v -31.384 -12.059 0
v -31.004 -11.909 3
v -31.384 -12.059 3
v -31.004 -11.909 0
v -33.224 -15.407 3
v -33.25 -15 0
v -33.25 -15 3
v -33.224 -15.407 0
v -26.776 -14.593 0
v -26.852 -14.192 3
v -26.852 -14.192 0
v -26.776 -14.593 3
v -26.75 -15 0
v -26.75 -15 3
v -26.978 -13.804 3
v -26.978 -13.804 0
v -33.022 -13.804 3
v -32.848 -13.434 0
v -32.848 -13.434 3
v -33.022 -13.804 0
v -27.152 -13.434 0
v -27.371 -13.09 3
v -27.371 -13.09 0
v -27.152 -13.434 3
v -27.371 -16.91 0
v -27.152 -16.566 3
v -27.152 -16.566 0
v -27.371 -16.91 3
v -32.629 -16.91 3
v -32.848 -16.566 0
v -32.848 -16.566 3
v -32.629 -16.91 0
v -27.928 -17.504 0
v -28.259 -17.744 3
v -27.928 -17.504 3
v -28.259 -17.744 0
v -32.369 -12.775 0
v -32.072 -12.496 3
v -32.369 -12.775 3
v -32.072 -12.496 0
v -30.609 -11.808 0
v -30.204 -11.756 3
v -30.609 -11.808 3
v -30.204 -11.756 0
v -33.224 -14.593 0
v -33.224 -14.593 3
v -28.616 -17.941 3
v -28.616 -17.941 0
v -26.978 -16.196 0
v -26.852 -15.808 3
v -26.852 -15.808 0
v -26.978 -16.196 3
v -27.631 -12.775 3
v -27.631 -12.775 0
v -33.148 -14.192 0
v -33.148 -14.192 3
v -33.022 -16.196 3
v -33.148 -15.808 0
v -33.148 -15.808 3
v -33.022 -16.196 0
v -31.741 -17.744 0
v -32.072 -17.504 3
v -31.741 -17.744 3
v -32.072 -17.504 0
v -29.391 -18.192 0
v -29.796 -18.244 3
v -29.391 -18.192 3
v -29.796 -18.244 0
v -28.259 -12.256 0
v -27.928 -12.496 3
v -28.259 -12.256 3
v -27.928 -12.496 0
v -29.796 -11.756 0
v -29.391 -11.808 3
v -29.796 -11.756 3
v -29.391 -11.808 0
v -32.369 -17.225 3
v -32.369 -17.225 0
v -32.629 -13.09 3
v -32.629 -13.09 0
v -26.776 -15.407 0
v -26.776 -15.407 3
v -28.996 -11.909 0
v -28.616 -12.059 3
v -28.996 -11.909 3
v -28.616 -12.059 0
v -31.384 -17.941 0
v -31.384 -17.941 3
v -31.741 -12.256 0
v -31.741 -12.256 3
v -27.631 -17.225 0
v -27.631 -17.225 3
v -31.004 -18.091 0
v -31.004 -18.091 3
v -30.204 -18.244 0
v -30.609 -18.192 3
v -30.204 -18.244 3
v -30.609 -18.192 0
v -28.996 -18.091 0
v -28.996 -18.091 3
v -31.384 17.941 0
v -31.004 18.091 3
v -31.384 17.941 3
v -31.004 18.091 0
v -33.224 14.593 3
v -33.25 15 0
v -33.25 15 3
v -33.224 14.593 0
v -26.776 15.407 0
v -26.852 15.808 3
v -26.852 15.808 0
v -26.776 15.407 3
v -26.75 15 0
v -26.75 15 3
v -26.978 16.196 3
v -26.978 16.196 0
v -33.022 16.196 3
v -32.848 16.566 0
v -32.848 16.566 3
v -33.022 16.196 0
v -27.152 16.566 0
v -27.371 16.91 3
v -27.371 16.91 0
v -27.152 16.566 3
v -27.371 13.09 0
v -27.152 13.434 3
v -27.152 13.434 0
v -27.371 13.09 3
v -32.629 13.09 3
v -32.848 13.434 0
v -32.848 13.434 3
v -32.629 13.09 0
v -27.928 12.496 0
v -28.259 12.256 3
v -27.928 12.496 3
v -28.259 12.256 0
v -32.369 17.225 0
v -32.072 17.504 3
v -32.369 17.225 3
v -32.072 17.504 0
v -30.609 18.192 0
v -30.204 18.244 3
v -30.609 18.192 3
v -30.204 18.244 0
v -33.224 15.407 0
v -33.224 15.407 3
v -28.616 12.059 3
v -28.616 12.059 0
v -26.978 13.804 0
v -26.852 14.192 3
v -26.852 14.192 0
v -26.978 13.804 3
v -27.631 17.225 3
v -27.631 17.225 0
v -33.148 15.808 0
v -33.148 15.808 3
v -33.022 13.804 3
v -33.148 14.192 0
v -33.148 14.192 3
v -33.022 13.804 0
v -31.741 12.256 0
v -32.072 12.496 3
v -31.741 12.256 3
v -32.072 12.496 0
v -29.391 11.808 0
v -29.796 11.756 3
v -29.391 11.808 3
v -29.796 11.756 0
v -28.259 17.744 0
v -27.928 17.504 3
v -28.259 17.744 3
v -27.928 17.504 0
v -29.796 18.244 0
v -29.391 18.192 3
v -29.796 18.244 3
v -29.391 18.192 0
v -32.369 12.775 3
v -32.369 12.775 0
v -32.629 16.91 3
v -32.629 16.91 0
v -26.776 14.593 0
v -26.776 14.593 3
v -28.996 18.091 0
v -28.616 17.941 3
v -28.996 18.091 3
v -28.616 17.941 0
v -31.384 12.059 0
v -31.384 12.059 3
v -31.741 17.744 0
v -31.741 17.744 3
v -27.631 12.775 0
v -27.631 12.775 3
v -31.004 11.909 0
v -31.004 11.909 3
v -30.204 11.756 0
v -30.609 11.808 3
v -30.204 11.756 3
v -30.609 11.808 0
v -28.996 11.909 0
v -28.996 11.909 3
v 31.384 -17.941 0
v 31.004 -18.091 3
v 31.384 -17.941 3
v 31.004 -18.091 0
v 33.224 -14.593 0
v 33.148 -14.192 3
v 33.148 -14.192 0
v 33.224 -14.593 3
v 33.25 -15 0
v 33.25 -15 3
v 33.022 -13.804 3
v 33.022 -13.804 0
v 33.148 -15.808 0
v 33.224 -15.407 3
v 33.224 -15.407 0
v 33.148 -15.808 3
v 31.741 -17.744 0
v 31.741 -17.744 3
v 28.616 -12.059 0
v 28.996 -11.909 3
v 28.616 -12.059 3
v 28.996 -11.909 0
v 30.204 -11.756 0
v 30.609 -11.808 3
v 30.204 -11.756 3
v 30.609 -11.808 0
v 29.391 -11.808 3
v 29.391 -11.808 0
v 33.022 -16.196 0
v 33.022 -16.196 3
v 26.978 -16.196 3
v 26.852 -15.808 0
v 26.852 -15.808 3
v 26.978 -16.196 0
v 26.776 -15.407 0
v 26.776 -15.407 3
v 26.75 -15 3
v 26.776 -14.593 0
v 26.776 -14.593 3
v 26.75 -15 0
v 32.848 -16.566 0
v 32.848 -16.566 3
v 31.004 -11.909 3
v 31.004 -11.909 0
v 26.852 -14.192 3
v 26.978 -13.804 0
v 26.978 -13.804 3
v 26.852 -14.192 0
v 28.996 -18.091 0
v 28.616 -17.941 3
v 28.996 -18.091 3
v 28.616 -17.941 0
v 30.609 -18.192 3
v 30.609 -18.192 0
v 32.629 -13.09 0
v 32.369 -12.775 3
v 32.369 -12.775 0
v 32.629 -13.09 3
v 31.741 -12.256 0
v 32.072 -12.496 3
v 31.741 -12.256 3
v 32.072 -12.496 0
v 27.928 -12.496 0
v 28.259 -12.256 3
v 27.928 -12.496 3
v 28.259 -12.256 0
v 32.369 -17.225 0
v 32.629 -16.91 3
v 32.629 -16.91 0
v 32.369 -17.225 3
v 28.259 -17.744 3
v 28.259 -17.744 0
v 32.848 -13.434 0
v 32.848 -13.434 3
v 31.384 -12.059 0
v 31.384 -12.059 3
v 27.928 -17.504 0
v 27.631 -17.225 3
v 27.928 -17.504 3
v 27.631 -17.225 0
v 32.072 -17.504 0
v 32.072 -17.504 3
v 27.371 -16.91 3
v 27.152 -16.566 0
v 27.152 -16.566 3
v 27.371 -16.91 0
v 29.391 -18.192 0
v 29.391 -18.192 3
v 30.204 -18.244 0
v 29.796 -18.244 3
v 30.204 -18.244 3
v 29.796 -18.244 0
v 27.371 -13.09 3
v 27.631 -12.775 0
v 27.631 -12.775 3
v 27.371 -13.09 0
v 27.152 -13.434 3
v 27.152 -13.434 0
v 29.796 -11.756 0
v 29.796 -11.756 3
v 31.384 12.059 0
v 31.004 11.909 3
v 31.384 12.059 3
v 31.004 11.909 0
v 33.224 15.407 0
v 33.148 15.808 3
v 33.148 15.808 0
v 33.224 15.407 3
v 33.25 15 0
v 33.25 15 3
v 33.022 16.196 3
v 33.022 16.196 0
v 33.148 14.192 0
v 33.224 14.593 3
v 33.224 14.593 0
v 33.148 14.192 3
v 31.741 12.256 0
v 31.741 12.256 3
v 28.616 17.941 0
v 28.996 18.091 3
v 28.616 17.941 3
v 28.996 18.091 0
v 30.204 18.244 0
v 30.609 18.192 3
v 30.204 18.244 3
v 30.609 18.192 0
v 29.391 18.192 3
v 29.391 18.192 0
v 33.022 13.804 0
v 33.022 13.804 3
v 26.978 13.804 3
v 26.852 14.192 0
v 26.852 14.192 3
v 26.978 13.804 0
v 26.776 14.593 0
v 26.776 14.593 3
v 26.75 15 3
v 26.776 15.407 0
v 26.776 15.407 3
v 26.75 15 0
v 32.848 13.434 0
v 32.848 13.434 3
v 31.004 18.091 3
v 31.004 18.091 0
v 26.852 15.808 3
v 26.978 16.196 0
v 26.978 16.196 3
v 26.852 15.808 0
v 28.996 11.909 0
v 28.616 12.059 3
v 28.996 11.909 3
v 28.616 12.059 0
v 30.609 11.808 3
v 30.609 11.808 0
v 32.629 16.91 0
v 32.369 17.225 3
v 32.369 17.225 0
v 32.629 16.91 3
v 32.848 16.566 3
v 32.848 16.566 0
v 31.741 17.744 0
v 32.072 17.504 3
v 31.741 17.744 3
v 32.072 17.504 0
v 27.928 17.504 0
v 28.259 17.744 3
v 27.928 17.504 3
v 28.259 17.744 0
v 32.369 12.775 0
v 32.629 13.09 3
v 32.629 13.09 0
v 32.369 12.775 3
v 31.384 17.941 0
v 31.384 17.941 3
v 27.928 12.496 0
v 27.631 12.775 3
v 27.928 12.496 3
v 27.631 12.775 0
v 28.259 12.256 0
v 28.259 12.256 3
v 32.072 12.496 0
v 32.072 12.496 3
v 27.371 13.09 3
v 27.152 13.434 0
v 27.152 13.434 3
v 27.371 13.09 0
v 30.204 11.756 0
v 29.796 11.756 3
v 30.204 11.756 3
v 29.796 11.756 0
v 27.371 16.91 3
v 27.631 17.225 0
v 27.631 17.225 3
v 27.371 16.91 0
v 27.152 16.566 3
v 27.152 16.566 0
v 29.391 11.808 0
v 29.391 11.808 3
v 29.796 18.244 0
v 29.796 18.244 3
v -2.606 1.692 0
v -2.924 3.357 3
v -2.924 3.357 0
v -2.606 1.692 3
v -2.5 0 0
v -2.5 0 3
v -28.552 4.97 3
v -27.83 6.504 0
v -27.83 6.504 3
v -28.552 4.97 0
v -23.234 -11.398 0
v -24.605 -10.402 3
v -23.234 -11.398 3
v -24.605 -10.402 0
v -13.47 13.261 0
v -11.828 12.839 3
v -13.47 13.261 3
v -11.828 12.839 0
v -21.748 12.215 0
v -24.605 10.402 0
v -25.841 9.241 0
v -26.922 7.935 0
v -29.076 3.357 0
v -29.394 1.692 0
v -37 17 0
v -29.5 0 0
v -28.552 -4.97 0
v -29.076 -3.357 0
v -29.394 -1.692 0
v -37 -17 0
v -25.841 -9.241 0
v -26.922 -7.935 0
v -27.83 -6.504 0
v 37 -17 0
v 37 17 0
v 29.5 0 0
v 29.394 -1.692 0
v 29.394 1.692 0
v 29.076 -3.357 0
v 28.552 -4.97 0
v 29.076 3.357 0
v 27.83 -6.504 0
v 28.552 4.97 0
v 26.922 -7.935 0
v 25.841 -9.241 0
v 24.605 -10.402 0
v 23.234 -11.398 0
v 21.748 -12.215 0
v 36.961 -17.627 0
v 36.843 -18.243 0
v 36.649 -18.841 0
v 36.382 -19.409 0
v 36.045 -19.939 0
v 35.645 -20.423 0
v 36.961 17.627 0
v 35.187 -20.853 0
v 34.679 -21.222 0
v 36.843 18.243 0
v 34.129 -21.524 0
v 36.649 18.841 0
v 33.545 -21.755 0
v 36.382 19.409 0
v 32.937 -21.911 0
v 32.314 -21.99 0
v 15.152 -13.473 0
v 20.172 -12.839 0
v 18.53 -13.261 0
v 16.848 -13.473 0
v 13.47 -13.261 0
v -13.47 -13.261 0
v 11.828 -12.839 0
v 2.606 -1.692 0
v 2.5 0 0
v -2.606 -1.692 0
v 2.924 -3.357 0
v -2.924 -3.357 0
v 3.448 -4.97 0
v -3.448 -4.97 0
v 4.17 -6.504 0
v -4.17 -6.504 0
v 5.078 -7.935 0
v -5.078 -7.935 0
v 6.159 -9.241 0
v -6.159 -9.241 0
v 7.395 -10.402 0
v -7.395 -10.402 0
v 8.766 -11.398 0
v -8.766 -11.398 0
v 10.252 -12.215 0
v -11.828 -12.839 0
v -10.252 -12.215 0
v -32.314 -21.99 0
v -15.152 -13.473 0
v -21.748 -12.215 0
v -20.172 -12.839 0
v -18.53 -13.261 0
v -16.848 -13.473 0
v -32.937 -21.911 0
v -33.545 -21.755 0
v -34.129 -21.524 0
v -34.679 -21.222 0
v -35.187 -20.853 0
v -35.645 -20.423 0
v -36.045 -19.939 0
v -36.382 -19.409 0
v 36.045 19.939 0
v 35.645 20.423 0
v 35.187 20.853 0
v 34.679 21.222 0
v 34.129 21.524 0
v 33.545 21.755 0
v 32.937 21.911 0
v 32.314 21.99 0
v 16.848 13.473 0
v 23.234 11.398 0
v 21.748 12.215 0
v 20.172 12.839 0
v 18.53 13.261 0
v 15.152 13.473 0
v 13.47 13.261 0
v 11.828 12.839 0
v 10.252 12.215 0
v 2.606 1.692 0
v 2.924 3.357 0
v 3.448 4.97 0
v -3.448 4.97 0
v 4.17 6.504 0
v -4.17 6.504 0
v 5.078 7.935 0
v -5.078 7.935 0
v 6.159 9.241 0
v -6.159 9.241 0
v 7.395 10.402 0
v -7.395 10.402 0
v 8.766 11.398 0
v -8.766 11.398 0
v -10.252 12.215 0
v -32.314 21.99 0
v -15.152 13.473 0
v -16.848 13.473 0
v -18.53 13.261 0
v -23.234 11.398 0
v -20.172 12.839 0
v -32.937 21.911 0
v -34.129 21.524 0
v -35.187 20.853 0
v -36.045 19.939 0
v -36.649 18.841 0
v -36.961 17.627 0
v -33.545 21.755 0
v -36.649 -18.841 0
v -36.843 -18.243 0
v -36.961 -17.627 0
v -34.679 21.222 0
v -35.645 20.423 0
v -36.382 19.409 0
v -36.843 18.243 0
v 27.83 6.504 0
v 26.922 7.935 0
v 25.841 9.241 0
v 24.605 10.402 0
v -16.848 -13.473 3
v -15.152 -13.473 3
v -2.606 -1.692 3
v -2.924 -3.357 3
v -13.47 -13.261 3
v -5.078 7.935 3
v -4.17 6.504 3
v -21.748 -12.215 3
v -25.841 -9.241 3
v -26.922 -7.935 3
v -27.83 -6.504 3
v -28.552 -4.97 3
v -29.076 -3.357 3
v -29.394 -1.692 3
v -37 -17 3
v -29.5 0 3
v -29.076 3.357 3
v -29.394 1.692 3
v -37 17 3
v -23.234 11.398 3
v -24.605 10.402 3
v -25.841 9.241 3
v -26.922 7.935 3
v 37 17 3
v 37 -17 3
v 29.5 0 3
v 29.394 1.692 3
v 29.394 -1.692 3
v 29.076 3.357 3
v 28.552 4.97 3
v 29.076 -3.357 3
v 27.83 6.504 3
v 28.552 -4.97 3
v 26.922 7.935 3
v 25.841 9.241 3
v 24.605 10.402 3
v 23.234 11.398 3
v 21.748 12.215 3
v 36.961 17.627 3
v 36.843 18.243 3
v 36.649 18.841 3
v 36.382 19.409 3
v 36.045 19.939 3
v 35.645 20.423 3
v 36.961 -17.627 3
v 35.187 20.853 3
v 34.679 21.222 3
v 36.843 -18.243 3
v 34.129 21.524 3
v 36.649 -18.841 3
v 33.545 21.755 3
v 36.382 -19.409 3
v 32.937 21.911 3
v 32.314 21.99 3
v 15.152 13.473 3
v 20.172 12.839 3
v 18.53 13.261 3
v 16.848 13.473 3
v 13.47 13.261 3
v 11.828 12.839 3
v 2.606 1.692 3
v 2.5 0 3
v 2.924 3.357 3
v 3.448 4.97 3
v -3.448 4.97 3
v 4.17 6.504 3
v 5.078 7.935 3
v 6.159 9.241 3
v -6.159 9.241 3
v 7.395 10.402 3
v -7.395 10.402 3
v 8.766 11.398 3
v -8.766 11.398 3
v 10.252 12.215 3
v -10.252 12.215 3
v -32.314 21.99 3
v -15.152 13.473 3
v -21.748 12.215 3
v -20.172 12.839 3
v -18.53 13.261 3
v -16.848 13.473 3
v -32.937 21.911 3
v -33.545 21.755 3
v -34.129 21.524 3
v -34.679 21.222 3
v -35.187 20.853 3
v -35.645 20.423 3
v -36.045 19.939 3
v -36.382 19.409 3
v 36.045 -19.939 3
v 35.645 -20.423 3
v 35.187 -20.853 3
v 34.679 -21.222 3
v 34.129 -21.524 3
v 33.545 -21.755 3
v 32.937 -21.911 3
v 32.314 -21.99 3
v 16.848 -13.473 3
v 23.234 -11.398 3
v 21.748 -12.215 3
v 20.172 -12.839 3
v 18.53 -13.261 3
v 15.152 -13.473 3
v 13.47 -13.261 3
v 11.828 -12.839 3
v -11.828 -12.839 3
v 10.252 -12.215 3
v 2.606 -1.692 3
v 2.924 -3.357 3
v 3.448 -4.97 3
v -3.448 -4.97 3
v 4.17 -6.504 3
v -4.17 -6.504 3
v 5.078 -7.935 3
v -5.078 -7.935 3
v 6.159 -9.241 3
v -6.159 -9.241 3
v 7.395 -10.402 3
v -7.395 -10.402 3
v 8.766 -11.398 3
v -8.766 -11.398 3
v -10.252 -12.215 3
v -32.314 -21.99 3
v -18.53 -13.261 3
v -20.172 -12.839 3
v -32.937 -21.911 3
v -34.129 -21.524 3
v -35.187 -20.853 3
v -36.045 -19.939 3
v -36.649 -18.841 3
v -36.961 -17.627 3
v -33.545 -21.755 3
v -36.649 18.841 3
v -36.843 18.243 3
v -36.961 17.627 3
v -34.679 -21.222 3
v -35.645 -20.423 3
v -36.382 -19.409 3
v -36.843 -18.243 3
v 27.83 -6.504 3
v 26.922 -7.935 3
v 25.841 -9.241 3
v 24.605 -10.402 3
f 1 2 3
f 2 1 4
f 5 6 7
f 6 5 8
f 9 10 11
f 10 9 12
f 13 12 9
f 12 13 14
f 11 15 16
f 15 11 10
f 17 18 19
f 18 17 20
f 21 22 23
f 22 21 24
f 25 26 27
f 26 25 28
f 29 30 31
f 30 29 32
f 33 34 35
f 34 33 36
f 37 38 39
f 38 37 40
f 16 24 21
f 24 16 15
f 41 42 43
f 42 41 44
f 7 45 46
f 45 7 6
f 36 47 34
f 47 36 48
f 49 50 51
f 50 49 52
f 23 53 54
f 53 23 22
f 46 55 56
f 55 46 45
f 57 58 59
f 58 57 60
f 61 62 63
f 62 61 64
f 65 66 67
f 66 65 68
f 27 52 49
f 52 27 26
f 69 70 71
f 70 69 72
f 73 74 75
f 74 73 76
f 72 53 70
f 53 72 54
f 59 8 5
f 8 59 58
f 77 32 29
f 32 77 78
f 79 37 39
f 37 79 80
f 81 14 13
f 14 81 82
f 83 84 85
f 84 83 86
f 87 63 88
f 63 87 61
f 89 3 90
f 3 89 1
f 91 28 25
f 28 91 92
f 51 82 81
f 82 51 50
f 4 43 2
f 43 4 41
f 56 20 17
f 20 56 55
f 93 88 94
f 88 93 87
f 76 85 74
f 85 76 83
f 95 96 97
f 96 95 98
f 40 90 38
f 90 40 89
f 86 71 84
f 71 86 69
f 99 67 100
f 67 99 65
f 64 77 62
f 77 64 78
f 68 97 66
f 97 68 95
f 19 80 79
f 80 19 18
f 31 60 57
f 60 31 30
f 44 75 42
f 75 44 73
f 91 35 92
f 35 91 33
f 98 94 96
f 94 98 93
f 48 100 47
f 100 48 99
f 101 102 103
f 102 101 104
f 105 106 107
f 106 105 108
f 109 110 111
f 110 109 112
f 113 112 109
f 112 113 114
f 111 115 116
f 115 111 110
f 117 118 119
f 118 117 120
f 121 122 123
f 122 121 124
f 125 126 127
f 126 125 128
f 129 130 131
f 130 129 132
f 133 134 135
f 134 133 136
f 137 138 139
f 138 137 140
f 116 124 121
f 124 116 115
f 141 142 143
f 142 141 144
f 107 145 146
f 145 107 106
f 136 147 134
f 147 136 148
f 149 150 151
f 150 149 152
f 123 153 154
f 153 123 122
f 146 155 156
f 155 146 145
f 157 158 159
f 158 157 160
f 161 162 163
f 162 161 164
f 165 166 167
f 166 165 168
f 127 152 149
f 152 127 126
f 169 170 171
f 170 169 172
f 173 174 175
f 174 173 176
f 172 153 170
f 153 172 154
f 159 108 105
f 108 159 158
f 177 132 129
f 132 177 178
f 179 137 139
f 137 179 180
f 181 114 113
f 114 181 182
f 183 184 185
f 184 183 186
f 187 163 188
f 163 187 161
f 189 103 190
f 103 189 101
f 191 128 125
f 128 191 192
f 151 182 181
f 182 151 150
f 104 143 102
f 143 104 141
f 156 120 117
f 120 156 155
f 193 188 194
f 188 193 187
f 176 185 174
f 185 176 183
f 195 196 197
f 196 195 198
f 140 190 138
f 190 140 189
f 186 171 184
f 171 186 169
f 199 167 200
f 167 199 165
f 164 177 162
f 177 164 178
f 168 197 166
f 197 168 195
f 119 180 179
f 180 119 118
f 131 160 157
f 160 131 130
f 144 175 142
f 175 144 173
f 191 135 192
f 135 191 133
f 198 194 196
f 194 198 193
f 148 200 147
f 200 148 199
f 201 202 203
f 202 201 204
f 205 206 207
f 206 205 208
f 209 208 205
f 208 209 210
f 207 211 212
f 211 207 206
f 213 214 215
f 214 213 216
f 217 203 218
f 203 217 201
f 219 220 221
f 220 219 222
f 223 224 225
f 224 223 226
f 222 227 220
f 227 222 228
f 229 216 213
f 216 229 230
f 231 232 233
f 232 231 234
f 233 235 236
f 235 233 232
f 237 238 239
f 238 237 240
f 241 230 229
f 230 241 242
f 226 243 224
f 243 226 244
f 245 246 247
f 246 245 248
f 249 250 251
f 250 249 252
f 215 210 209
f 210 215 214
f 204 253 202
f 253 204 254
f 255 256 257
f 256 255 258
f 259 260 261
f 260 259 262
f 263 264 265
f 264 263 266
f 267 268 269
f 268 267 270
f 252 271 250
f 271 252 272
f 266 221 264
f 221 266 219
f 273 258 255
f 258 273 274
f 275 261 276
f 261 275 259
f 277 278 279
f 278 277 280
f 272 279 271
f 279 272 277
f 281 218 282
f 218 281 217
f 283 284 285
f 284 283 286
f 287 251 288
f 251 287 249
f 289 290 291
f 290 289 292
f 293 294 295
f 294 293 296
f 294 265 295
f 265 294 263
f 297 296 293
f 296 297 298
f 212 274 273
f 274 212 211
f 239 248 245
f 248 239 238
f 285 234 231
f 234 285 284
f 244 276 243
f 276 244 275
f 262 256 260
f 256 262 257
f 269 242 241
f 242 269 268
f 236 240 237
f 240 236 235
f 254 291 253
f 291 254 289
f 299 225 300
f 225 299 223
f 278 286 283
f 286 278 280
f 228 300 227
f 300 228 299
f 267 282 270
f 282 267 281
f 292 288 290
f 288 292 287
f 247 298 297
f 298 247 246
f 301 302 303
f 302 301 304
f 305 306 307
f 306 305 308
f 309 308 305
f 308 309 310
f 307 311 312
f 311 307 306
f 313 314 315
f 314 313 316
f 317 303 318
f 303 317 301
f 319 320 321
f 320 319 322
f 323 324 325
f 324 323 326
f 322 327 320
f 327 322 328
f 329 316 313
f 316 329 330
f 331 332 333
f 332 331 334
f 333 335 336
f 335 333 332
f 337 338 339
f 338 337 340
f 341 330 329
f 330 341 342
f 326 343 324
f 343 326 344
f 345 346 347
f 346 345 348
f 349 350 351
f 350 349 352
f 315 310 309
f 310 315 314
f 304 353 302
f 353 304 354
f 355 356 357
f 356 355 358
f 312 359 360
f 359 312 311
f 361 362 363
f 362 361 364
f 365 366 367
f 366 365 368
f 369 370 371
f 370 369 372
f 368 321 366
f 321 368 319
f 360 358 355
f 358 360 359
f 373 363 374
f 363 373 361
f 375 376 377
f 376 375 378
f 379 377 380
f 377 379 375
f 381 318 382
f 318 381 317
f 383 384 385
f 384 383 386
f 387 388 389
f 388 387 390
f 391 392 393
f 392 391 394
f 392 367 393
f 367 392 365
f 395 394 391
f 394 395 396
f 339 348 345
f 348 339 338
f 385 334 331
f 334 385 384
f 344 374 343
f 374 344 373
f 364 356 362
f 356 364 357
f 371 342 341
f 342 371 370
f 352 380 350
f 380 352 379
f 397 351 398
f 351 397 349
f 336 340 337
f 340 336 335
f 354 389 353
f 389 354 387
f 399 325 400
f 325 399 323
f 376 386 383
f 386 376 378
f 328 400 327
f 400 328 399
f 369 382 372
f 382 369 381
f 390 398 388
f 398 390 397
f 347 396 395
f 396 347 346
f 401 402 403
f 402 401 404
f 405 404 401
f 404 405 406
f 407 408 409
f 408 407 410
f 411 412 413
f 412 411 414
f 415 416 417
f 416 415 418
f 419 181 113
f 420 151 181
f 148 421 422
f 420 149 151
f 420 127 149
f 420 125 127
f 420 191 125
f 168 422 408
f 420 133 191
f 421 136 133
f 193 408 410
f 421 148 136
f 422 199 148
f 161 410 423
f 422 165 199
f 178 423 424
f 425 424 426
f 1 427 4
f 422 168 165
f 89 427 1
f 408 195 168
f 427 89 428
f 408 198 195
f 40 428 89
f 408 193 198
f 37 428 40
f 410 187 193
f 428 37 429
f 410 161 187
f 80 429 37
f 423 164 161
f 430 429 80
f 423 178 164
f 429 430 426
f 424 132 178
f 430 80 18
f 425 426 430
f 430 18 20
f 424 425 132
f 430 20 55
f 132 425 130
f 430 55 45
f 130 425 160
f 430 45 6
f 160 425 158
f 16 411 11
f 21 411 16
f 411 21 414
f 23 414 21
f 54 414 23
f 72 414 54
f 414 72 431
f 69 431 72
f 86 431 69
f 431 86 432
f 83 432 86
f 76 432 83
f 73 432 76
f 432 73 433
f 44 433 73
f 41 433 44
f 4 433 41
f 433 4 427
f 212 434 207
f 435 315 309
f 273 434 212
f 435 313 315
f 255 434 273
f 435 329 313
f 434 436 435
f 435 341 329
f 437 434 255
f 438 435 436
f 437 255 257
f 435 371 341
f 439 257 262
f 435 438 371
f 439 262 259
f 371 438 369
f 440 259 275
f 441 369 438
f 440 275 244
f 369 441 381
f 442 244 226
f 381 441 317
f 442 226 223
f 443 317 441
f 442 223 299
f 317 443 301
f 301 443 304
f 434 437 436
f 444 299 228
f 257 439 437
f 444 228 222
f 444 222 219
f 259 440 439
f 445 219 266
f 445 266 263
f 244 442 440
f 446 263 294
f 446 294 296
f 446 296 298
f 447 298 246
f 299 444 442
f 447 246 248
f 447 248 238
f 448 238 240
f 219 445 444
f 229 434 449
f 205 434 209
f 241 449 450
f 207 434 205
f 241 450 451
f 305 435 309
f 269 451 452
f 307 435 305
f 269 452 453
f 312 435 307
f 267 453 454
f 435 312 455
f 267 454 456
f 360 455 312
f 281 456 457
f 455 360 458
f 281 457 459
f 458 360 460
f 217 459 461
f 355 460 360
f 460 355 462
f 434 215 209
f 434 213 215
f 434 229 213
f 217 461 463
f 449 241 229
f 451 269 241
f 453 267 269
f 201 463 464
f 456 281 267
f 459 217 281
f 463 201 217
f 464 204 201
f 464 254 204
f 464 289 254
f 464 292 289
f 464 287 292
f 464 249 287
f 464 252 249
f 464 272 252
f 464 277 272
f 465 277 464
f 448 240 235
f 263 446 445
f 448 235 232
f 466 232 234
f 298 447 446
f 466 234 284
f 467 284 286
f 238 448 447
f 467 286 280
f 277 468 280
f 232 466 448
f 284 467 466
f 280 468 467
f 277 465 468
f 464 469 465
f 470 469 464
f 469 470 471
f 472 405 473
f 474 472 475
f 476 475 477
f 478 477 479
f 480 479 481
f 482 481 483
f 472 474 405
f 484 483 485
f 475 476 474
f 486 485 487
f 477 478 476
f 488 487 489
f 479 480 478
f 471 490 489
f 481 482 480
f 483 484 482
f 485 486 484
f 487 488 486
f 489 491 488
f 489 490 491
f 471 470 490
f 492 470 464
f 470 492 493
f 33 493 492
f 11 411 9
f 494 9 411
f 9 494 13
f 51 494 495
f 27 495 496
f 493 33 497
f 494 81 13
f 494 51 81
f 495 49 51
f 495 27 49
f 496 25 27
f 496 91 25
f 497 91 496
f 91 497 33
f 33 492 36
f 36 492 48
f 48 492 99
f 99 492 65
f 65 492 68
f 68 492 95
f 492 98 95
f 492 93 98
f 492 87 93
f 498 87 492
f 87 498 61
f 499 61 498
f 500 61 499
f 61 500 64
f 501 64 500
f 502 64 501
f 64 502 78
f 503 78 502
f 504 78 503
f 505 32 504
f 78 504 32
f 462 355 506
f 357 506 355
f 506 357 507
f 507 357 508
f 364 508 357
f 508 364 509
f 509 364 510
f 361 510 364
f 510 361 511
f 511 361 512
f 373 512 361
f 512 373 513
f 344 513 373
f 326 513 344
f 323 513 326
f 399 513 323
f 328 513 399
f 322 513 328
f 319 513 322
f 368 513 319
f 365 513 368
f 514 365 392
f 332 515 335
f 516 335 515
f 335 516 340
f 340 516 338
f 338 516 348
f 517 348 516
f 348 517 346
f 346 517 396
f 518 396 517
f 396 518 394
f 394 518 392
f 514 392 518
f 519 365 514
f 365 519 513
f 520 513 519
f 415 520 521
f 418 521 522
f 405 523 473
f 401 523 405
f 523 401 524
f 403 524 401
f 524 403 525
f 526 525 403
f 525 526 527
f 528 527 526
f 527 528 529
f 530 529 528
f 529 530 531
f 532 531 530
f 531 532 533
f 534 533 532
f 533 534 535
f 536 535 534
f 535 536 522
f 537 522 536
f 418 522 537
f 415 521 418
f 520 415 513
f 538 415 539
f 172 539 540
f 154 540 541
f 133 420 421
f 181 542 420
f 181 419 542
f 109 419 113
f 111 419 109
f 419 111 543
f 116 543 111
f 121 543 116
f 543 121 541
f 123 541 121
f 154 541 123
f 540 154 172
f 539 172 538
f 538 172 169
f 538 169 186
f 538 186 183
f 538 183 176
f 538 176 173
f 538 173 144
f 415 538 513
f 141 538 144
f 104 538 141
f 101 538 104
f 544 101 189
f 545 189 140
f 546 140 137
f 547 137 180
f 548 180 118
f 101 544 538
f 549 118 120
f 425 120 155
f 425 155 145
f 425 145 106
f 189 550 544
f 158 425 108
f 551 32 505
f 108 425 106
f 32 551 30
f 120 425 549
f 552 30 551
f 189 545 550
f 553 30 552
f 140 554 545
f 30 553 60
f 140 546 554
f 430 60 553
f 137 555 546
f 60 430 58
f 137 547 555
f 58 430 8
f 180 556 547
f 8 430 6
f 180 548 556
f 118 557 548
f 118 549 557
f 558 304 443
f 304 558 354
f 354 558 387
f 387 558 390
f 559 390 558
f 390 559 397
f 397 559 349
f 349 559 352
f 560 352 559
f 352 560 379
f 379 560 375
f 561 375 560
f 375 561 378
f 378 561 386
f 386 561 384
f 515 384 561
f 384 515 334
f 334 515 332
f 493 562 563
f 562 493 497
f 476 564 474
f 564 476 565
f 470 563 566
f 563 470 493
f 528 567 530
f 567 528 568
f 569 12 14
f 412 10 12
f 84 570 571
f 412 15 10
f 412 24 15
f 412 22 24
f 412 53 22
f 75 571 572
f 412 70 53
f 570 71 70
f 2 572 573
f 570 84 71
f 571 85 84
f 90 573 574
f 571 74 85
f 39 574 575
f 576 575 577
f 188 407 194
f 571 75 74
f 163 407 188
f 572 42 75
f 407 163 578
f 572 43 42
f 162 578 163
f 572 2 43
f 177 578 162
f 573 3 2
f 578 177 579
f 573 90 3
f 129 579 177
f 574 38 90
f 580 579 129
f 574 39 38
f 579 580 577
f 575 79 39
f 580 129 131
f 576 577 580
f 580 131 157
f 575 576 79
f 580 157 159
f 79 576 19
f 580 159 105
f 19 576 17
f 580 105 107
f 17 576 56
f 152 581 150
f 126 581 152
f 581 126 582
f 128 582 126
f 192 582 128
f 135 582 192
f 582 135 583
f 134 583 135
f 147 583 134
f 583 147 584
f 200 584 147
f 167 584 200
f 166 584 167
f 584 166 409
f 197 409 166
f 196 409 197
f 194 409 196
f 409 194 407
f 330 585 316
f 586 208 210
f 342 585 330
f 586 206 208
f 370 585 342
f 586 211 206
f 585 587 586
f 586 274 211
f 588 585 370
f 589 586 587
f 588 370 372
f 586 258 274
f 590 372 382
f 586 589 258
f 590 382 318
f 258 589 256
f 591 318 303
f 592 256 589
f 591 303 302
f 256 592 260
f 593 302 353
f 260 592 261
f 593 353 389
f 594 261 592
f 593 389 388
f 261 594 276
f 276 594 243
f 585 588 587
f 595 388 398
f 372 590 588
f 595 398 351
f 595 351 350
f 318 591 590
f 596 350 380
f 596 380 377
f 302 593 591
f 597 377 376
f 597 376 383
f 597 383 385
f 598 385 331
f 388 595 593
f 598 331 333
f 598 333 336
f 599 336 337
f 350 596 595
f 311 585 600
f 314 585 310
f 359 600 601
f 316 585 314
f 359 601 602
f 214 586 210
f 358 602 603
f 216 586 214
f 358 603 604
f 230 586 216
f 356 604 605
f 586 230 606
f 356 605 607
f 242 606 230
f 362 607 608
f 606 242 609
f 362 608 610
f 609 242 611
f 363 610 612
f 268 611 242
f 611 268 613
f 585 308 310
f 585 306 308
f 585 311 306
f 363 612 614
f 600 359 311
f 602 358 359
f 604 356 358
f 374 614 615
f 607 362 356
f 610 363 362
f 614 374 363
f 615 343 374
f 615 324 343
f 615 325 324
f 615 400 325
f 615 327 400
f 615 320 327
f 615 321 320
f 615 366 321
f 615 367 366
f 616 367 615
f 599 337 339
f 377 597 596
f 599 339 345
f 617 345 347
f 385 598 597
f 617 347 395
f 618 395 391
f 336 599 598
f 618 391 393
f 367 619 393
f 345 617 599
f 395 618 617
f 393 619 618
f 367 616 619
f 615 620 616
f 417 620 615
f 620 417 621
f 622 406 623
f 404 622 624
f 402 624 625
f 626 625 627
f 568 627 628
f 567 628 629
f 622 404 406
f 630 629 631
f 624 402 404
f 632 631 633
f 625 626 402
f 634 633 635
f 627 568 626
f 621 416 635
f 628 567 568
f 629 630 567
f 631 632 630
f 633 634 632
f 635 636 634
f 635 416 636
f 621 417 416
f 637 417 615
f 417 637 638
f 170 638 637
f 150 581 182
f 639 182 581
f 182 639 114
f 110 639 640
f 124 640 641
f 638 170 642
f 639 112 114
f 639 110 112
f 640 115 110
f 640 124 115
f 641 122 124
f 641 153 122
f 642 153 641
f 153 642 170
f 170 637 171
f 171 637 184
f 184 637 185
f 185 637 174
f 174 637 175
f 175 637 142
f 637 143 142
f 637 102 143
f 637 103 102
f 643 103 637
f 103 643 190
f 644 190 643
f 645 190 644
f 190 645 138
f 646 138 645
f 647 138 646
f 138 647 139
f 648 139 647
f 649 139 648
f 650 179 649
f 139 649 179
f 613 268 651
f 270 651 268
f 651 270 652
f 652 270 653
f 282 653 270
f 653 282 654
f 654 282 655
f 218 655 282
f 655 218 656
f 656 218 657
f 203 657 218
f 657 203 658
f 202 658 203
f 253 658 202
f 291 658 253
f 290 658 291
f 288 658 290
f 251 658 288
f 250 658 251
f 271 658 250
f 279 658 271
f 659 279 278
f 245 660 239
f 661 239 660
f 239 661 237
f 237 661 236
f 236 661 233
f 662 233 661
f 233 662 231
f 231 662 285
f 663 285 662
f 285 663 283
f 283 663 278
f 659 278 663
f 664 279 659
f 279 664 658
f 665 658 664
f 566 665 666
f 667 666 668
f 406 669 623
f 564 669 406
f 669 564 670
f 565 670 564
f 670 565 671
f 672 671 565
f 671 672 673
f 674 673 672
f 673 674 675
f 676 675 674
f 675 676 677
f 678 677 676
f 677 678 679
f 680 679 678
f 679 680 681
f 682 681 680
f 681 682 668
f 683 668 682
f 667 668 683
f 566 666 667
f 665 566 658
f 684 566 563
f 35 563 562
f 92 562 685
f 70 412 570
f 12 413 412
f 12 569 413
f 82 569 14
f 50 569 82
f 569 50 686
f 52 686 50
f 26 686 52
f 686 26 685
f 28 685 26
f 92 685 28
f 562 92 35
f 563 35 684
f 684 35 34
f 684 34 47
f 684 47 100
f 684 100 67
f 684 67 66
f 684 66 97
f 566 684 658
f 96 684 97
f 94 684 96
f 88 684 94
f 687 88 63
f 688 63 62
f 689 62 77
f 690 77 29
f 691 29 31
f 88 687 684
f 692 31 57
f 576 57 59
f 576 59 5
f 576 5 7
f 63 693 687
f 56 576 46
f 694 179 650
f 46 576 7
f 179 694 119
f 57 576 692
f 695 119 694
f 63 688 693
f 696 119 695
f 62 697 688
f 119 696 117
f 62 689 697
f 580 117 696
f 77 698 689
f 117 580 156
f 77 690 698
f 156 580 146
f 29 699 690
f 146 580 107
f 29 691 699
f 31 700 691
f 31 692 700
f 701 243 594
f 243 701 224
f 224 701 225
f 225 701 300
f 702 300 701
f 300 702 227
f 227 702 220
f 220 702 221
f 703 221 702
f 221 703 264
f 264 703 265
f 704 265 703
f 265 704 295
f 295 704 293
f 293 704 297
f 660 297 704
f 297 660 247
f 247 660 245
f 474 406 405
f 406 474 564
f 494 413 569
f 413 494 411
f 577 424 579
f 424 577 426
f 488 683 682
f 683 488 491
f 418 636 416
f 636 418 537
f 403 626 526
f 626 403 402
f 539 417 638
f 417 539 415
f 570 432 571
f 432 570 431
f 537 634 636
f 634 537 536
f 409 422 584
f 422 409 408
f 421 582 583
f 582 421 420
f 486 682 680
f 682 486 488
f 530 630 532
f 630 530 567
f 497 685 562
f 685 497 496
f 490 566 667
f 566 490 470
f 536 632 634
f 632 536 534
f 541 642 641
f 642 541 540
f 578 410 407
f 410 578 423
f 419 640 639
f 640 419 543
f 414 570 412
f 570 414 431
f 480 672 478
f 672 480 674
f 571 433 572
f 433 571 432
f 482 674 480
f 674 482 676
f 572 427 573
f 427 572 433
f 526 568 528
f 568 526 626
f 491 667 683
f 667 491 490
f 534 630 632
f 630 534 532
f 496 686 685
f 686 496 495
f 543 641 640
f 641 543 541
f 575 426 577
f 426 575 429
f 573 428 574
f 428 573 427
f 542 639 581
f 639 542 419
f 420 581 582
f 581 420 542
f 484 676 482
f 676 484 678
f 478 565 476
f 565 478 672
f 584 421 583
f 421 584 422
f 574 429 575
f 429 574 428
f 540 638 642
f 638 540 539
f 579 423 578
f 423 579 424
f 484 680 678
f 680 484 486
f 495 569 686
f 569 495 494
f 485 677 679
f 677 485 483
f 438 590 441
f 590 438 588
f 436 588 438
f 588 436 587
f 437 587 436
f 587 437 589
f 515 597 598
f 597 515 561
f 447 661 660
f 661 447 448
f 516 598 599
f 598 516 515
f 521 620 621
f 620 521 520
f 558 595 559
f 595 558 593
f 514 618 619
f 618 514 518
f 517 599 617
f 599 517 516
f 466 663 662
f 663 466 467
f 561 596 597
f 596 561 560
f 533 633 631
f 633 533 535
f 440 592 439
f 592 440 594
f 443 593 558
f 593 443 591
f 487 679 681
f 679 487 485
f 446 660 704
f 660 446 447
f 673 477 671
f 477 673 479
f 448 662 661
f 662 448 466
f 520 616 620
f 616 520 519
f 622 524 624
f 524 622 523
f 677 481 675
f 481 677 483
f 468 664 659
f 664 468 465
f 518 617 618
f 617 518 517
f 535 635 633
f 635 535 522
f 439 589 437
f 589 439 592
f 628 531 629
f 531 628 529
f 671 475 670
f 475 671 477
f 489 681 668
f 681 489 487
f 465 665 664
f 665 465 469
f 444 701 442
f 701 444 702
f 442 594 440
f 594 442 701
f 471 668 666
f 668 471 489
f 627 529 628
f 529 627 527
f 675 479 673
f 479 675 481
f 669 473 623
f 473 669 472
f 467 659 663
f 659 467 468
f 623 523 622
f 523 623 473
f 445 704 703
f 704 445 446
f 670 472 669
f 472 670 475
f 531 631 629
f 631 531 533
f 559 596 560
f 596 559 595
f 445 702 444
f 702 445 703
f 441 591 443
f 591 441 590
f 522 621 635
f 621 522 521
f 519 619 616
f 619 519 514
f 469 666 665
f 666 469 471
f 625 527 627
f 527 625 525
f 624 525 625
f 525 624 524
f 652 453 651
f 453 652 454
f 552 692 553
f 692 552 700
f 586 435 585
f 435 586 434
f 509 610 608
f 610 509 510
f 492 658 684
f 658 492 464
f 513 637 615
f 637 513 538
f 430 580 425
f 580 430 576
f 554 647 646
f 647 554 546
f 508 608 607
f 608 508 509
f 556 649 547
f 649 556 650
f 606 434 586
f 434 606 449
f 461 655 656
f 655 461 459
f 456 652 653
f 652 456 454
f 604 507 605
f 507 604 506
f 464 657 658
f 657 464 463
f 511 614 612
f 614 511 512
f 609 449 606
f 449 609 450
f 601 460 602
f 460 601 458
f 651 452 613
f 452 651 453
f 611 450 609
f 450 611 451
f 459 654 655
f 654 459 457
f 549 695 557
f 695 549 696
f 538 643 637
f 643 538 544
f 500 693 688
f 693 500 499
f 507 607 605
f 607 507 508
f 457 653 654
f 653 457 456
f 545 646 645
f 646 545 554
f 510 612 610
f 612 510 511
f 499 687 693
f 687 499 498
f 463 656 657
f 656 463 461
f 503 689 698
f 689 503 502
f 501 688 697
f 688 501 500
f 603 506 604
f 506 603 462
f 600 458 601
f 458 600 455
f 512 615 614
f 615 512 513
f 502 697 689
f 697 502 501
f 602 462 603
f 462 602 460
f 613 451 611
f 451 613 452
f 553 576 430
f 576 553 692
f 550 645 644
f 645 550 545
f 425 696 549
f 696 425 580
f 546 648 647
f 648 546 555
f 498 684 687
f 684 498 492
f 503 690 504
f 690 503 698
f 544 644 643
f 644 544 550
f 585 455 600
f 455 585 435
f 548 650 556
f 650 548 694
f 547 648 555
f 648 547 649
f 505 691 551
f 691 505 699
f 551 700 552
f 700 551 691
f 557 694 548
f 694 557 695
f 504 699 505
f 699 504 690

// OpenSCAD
$fn = 50;


difference() {
	union() {
		hull() {
			translate(v = [-32.0000000000, 17.0000000000, 0]) {
				cylinder(h = 3, r = 5);
			}
			translate(v = [32.0000000000, 17.0000000000, 0]) {
				cylinder(h = 3, r = 5);
			}
			translate(v = [-32.0000000000, -17.0000000000, 0]) {
				cylinder(h = 3, r = 5);
			}
			translate(v = [32.0000000000, -17.0000000000, 0]) {
				cylinder(h = 3, r = 5);
			}
		}
	}
	union() {
		#translate(v = [-30.0000000000, -15.0000000000, -100.0000000000]) {
			cylinder(h = 200, r = 3.2500000000);
		}
		#translate(v = [-30.0000000000, 15.0000000000, -100.0000000000]) {
			cylinder(h = 200, r = 3.2500000000);
		}
		#translate(v = [30.0000000000, -15.0000000000, -100.0000000000]) {
			cylinder(h = 200, r = 3.2500000000);
		}
		#translate(v = [30.0000000000, 15.0000000000, -100.0000000000]) {
			cylinder(h = 200, r = 3.2500000000);
		}
		#translate(v = [-16.0000000000, 0, 0]) {
			cylinder(h = 3, r = 13.5000000000);
		}
		#translate(v = [16.0000000000, 0, 0]) {
			cylinder(h = 3, r = 13.5000000000);
		}
	}
}
